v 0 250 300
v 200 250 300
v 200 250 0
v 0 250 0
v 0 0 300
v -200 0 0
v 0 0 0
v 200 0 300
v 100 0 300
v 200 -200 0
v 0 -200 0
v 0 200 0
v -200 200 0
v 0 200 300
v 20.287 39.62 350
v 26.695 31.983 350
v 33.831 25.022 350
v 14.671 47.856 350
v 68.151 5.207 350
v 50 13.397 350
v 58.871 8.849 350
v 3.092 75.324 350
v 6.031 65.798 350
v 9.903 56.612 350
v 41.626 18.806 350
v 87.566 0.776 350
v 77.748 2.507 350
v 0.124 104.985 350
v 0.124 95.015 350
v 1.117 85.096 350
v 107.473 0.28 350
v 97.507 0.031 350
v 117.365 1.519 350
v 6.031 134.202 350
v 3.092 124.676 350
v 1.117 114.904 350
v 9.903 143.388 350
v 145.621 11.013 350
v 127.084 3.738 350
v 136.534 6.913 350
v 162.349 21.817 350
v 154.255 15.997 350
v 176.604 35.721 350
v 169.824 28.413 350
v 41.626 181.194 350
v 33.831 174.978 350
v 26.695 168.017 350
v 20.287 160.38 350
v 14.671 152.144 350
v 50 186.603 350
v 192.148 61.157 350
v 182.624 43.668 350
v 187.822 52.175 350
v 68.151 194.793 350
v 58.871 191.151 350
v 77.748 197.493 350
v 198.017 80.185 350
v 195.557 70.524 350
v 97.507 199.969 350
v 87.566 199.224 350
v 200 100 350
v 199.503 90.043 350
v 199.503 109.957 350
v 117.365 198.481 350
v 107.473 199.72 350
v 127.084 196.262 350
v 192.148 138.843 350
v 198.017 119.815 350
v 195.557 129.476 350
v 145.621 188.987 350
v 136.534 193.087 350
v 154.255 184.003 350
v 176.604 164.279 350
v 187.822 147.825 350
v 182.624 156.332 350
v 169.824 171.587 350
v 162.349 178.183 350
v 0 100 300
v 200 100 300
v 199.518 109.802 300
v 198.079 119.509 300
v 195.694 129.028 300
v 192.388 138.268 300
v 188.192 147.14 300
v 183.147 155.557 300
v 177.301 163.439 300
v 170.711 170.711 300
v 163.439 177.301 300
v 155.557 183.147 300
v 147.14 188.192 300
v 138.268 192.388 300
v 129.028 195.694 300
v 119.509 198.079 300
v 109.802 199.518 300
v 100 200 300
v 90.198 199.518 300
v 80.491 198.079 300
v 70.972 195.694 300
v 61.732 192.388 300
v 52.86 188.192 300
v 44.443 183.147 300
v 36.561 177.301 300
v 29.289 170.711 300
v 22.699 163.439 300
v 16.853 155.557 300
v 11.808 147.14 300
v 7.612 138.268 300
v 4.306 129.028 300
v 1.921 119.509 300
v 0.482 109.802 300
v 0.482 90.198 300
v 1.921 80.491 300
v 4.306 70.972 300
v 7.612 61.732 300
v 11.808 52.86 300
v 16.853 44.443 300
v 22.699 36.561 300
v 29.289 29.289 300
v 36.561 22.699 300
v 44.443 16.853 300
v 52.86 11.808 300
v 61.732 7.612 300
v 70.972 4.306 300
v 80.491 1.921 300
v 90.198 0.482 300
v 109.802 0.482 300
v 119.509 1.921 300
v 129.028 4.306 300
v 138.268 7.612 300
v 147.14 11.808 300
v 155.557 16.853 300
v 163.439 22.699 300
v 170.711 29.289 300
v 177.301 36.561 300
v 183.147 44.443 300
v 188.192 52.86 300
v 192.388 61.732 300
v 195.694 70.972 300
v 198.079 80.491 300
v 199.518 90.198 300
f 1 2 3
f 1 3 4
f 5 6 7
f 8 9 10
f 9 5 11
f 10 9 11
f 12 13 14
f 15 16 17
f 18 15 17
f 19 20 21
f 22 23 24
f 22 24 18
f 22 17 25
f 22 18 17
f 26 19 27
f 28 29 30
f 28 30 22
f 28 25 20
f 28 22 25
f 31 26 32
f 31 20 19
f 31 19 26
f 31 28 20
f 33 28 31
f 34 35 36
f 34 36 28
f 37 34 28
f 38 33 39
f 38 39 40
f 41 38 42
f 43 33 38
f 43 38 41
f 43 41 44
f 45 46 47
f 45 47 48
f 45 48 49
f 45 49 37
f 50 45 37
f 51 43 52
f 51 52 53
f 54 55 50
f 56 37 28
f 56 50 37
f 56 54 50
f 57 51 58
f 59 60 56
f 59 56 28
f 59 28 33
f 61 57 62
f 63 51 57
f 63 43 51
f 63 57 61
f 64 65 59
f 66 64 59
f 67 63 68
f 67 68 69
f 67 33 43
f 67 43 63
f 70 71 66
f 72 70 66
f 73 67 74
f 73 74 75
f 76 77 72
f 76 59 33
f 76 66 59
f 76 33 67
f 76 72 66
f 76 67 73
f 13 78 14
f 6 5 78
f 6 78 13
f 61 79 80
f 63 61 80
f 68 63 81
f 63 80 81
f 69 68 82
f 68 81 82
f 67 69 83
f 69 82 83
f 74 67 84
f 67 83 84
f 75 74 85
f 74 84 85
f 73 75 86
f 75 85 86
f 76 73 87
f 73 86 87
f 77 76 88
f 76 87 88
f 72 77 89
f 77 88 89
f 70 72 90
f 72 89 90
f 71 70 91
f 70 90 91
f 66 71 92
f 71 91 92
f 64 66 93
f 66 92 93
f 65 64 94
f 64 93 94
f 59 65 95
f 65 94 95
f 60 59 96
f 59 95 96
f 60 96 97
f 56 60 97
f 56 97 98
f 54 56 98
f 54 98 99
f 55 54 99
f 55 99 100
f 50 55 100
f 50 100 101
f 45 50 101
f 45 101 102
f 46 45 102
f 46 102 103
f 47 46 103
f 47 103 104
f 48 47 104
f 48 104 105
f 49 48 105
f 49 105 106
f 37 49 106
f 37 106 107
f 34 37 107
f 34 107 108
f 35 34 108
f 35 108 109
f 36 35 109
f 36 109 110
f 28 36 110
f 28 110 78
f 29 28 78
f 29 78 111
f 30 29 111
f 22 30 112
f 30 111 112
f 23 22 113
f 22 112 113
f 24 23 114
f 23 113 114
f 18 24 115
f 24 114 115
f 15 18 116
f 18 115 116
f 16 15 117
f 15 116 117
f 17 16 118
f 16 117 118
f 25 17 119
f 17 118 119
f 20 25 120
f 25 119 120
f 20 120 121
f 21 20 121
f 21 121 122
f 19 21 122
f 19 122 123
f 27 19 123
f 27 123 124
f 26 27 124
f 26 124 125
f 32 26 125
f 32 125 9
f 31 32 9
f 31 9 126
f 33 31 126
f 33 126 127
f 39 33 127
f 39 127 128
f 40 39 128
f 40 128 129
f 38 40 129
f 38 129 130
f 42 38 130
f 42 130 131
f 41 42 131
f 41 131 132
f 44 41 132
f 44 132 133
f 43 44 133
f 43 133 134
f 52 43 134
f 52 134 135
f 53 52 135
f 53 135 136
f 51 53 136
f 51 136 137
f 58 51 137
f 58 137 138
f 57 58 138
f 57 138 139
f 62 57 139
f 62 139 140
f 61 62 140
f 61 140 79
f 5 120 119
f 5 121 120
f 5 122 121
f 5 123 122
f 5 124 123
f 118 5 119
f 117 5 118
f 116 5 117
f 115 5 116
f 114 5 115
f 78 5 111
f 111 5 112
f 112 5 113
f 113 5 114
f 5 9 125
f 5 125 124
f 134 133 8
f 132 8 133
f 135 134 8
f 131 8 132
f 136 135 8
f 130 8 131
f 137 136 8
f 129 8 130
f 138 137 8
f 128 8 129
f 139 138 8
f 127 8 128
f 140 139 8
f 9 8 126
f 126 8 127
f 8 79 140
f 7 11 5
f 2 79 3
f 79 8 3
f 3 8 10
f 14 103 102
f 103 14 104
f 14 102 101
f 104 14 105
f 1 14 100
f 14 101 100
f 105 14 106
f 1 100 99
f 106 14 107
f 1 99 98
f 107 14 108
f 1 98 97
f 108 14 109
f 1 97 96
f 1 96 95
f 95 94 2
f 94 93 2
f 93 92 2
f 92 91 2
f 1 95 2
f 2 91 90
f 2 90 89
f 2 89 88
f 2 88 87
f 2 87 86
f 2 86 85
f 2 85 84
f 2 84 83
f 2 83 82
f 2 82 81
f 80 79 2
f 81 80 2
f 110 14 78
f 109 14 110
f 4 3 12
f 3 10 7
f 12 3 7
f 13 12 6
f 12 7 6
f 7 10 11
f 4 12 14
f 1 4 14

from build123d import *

# Parameters (mm, degrees)
F0_W     = 200
F0_H     = 300
F1_DEPTH = 200
F3_DEPTH = 200
F4_R     = 100
F5_DEPTH = 50
F7_DEPTH = 200
F9_DEPTH = 50


with BuildPart() as f1:
    # F0 (on Right) → F1 (new body)
    with BuildSketch(Plane.YZ):
        with Locations((100, 150)):
            Rectangle(F0_W, F0_H)
    extrude(amount=F1_DEPTH)

    # F2 (on Right) → F3 (join)
    with BuildSketch(Plane.YZ):
        Polygon((-200, 0), (0, 0), (0, 300), align=None)
    extrude(amount=F3_DEPTH)

    # F4 (on face) → F5 (join)
    with BuildSketch(Plane.XY.offset(300)):
        with Locations((100, 100)):
            Circle(F4_R)
    extrude(amount=F5_DEPTH)

    # F6 (on Front) → F7 (join)
    with BuildSketch(Plane.XZ):
        Polygon((-200, 0), (0, 0), (0, 300), align=None)
    extrude(amount=-F7_DEPTH)

    # F8 (on face) → F9 (join)
    with BuildSketch(Plane(origin=(0, 200, 0), x_dir=(-1, 0, 0), z_dir=(0, 1, 0))):
        Polygon((-100, 300), (-200, 300), (-200, 0), (0, 0), (0, 300), align=None)
    extrude(amount=F9_DEPTH)


solid = f1.part
